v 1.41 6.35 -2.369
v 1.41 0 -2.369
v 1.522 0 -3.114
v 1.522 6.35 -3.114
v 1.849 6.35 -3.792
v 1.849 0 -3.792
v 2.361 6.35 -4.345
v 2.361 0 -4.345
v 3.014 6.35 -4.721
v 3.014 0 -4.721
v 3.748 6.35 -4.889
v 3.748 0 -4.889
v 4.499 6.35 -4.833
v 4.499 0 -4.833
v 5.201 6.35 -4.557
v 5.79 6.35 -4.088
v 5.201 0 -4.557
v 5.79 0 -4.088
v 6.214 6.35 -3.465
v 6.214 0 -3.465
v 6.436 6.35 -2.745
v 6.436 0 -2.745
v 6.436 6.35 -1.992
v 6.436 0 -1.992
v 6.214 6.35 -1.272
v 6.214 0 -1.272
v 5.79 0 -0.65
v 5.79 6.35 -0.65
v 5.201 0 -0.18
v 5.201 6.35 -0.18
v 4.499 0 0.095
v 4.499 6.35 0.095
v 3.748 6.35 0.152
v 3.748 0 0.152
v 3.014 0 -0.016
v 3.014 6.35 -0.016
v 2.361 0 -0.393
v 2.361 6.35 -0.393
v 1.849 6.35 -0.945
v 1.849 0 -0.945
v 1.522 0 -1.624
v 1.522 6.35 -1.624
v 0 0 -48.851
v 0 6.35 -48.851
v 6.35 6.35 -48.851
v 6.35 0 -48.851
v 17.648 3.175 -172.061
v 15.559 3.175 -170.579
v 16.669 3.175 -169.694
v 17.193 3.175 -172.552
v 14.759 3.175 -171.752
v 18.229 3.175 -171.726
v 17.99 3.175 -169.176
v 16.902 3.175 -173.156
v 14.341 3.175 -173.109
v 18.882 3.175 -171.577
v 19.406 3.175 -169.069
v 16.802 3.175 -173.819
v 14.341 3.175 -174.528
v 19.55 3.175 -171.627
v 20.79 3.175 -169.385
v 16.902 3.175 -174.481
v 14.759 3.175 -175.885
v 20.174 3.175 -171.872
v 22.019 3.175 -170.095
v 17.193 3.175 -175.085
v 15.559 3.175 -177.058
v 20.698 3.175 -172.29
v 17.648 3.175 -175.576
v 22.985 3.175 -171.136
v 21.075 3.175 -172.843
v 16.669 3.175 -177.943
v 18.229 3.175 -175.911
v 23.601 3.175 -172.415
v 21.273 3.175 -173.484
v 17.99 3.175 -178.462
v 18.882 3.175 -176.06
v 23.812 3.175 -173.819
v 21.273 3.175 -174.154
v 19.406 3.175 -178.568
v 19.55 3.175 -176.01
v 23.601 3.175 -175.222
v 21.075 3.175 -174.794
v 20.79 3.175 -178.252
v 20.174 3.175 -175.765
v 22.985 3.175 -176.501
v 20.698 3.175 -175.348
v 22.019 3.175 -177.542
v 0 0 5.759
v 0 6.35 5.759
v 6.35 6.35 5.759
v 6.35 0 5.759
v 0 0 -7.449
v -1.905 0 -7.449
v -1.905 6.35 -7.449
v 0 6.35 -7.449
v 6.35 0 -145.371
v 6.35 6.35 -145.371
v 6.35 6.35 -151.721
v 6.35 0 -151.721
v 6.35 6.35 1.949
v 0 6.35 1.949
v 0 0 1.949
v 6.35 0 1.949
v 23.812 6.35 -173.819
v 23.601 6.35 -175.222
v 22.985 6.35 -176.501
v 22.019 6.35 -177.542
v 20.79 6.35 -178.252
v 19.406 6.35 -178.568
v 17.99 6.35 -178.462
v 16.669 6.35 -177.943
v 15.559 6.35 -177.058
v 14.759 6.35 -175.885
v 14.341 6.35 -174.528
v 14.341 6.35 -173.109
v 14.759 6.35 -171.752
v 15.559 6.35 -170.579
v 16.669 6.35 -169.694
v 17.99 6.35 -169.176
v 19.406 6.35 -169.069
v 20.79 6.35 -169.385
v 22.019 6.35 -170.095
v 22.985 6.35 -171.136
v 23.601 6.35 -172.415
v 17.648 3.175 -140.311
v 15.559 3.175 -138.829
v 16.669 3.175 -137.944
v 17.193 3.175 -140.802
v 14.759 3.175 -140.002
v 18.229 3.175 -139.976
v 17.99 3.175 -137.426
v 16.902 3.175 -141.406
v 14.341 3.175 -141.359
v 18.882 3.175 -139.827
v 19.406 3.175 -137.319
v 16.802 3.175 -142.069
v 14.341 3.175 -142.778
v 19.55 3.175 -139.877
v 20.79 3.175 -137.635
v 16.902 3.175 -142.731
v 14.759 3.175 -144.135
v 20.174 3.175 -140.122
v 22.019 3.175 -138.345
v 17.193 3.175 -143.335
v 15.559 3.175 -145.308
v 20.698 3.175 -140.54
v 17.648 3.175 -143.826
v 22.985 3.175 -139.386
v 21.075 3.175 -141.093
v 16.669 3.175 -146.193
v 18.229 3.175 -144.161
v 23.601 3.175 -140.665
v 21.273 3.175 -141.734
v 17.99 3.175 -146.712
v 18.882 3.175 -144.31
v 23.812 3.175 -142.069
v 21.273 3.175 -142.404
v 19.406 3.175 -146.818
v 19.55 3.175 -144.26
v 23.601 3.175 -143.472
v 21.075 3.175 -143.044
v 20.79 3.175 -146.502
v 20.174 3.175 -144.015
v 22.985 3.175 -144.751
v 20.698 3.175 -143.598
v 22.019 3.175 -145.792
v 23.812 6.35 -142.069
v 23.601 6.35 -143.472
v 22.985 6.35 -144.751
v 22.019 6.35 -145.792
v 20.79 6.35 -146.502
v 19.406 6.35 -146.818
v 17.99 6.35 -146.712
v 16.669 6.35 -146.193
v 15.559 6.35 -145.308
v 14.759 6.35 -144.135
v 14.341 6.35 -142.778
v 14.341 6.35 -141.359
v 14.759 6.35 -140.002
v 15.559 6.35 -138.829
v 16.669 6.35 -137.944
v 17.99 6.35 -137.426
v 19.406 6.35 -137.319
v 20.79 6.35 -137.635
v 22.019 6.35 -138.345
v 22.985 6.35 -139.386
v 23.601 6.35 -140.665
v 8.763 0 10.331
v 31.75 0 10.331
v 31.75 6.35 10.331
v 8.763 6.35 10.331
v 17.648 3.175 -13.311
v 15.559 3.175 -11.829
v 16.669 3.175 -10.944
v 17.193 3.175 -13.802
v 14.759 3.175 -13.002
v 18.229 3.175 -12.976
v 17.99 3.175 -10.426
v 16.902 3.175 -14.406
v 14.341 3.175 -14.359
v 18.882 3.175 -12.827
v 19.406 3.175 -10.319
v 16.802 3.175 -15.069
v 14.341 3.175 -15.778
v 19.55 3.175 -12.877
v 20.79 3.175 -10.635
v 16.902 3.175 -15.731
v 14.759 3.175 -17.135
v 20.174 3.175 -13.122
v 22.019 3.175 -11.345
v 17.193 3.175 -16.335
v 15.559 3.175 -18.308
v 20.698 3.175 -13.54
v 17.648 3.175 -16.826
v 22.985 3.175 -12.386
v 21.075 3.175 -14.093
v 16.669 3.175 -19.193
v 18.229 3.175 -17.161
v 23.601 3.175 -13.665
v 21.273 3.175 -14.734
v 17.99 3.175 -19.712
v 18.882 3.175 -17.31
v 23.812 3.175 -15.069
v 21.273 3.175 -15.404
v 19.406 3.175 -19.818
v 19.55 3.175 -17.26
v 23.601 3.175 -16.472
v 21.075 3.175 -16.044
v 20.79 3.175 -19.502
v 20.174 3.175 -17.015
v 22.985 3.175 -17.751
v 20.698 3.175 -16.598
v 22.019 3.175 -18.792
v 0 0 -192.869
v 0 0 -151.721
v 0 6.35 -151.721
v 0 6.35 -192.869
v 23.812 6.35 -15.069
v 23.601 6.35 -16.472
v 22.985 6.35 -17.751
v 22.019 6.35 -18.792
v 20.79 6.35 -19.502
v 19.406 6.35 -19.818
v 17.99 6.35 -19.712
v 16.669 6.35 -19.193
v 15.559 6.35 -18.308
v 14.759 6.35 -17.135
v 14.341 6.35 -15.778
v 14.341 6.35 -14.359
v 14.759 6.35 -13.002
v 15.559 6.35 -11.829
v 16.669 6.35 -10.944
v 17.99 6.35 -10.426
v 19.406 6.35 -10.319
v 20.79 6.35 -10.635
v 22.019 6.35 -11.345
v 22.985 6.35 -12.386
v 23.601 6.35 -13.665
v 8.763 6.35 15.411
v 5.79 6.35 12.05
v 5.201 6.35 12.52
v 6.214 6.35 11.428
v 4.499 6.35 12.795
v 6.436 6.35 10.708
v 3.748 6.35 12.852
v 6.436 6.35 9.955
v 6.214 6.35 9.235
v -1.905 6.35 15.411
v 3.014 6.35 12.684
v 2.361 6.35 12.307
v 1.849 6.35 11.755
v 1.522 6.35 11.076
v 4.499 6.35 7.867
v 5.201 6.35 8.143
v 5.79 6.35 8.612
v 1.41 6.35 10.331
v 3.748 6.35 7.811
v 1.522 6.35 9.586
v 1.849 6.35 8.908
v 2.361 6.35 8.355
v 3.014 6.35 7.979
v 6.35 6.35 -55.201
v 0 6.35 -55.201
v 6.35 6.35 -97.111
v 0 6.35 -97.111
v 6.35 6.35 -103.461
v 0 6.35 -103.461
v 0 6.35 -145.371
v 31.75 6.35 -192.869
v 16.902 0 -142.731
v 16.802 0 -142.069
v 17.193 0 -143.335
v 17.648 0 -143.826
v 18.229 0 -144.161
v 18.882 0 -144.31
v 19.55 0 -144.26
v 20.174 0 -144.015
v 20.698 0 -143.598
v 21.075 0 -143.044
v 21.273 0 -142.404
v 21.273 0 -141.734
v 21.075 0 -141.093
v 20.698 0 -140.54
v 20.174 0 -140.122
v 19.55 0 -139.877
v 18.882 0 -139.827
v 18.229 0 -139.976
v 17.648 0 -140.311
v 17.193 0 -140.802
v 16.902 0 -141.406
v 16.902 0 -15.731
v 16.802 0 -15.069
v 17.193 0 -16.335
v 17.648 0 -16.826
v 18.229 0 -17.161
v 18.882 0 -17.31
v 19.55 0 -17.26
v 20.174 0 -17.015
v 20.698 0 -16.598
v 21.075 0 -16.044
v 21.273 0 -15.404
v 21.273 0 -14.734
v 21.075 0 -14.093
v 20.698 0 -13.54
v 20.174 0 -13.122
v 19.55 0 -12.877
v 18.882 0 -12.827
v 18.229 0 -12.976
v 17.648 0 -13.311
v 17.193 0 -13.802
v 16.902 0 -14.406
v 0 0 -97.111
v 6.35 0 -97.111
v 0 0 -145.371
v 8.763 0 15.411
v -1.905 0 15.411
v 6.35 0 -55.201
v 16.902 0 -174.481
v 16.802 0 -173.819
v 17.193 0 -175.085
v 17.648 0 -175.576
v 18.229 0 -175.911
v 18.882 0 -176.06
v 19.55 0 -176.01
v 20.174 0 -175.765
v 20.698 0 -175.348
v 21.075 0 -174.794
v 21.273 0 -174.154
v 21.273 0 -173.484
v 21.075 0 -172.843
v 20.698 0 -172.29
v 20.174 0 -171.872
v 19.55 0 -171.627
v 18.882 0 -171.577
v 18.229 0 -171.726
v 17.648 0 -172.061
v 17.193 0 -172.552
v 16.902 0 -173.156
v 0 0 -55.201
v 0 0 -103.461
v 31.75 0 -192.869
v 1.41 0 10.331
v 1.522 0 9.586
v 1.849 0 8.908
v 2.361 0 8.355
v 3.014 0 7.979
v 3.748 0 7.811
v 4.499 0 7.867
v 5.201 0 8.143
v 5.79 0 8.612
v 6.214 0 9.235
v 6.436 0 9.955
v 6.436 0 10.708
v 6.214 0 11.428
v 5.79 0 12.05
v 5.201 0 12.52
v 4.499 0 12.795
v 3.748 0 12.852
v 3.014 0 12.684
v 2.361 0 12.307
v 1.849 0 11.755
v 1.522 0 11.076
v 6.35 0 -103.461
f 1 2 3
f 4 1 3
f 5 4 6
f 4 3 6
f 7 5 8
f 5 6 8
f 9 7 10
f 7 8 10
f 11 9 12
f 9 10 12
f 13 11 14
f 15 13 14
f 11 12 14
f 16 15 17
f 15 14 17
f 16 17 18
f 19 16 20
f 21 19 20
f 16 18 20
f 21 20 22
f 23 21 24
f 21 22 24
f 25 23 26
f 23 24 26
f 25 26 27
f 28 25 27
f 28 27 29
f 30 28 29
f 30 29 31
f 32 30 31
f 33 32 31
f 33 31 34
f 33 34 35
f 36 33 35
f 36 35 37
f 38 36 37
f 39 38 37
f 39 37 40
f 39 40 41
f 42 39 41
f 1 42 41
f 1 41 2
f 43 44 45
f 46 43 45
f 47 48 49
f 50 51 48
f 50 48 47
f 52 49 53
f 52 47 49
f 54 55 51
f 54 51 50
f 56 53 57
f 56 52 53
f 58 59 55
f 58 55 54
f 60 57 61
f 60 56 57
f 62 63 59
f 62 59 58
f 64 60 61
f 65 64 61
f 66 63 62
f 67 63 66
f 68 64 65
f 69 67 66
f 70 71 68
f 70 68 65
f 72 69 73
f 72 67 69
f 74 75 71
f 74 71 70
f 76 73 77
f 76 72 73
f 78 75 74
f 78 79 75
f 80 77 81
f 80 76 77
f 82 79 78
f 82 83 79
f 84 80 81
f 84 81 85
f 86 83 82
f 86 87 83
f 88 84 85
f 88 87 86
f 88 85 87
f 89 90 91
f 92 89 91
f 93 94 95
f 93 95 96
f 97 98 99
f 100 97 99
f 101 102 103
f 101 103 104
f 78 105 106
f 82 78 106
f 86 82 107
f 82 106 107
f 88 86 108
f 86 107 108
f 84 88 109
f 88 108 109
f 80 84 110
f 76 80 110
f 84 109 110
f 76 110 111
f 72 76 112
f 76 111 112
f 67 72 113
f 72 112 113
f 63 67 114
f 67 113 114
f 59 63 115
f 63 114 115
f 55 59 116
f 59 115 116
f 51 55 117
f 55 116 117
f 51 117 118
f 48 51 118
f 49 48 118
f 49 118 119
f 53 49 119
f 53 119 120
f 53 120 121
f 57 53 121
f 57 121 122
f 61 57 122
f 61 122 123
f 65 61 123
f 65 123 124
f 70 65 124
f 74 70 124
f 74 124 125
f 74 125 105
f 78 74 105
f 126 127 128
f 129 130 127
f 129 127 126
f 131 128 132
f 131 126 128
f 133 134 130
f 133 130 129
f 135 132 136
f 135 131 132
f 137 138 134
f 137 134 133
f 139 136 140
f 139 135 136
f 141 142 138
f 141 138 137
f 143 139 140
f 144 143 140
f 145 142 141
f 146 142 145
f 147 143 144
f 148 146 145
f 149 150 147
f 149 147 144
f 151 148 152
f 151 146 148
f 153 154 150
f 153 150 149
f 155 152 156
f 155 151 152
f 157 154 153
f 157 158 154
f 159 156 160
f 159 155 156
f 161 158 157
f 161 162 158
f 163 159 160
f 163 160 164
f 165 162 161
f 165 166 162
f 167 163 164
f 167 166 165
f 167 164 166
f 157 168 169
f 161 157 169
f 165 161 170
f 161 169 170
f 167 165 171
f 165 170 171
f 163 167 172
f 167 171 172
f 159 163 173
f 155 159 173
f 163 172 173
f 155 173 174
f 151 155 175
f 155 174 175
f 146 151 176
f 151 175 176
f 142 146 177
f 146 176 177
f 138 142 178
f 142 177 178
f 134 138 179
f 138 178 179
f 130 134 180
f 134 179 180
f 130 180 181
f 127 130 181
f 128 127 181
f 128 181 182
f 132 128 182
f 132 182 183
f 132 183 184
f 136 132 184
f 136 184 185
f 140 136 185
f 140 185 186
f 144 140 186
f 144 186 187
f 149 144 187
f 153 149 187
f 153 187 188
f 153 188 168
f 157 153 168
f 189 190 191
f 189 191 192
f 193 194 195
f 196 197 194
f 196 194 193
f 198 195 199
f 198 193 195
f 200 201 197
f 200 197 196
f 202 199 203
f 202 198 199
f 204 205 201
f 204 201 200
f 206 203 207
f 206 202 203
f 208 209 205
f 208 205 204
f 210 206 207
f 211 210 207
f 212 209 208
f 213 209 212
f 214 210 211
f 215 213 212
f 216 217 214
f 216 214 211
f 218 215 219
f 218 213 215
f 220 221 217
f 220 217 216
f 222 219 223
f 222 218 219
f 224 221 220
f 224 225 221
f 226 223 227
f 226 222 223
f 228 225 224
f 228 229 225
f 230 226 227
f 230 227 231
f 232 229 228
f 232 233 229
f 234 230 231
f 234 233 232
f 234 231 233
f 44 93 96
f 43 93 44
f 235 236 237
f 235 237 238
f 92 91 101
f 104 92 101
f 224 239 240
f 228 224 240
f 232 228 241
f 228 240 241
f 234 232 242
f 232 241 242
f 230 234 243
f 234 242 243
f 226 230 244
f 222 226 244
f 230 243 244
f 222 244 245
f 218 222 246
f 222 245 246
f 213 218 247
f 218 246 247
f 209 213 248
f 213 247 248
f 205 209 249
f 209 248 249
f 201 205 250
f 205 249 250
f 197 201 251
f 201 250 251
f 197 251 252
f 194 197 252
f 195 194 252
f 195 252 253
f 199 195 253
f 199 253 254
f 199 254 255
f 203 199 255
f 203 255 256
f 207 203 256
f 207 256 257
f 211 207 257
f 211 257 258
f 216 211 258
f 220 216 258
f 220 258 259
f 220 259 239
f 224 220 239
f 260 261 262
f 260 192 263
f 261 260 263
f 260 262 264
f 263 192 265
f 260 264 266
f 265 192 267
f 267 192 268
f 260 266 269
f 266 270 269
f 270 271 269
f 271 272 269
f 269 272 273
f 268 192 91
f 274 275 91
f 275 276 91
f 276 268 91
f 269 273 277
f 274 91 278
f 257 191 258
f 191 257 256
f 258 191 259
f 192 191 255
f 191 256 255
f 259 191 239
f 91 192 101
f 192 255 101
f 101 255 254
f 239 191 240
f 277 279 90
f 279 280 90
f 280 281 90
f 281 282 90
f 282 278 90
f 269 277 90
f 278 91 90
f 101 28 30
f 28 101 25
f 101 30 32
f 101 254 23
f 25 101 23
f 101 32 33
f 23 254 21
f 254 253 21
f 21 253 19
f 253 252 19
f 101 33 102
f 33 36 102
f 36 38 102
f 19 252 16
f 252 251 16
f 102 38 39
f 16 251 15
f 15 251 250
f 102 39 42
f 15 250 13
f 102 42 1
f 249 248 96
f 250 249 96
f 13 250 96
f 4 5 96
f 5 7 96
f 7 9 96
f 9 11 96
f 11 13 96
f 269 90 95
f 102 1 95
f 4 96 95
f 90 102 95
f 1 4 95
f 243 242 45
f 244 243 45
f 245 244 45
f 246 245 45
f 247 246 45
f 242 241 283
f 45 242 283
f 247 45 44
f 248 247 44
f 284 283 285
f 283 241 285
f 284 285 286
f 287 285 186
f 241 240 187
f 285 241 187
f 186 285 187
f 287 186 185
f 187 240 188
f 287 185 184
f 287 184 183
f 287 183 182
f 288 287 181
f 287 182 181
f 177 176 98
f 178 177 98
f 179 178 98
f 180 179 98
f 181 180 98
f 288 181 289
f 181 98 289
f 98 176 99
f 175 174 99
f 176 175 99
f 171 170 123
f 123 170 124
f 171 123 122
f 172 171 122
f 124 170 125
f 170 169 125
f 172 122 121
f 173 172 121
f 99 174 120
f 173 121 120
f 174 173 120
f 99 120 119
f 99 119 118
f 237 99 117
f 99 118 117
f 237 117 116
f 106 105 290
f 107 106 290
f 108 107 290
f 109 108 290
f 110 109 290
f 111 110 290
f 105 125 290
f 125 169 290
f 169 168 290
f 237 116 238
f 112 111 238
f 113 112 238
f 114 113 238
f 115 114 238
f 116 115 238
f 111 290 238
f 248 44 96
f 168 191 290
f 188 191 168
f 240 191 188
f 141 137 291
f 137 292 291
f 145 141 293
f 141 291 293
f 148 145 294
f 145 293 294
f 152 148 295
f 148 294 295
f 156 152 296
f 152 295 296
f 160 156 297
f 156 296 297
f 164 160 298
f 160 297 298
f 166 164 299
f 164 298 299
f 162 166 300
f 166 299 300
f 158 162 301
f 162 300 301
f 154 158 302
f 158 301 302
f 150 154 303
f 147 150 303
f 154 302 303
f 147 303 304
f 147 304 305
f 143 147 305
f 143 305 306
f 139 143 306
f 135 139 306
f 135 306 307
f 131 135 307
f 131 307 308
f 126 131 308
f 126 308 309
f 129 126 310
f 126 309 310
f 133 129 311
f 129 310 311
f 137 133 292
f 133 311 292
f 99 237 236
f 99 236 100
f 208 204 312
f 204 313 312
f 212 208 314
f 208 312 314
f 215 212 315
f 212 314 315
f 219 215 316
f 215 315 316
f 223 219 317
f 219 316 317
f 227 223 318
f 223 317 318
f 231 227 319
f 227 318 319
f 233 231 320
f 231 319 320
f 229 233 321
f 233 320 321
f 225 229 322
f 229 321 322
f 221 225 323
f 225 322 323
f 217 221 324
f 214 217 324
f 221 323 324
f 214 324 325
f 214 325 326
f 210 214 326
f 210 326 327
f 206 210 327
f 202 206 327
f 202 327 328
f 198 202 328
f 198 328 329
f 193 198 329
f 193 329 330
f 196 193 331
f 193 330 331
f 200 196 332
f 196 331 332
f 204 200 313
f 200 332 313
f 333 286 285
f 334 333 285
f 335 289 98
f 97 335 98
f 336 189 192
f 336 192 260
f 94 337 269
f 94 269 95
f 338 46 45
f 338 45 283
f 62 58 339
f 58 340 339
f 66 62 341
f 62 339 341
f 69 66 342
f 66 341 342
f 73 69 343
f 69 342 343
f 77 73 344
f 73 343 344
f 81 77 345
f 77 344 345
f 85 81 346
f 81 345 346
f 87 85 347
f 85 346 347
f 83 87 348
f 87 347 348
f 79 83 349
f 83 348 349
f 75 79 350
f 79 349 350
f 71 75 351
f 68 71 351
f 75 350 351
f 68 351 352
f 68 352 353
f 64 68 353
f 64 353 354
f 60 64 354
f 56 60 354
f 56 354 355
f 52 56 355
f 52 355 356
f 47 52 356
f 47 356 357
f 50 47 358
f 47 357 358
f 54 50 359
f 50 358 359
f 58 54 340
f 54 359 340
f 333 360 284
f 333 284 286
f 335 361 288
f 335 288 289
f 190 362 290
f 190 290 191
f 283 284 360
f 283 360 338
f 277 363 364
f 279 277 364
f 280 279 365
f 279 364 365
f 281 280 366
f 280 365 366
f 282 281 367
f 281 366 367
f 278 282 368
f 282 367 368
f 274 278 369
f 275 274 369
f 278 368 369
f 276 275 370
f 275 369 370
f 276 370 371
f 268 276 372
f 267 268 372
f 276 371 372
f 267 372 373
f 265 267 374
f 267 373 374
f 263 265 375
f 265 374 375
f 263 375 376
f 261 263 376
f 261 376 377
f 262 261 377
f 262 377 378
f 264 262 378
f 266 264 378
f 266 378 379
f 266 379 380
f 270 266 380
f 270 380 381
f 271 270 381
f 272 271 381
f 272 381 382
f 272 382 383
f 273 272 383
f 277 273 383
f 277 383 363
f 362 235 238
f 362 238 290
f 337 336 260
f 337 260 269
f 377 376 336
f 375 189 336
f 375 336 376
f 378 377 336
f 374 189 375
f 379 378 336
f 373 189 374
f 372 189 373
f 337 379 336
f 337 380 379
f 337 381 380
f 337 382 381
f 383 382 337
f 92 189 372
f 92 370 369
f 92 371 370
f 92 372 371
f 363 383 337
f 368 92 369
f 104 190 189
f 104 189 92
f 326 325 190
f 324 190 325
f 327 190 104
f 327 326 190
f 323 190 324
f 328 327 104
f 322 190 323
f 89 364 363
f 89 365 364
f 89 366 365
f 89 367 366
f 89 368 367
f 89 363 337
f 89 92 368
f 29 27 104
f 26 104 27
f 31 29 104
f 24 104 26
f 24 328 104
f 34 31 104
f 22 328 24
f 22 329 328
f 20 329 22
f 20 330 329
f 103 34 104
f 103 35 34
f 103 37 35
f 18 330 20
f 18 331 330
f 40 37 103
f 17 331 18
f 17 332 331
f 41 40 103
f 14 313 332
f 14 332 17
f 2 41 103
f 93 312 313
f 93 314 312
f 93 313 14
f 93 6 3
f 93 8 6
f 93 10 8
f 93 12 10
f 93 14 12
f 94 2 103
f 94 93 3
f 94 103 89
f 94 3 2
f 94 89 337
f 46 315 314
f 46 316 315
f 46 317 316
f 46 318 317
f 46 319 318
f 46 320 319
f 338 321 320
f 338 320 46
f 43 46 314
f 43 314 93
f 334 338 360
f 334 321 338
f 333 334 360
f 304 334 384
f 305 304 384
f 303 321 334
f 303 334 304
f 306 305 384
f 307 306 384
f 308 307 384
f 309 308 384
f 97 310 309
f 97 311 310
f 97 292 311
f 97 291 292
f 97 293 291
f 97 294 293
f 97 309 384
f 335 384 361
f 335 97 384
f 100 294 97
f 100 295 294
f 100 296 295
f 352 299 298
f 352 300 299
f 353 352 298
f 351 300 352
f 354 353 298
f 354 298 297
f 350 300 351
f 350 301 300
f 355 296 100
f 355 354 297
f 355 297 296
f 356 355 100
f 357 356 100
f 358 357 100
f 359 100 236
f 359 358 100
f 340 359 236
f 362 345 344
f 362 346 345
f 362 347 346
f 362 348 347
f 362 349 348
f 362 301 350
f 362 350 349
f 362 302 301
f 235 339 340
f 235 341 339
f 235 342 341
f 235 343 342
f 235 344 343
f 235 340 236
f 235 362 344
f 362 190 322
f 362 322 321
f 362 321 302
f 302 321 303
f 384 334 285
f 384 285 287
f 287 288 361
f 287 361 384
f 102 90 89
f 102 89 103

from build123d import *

# Parameters (mm, degrees)
BOSS_EXTRUDE1_DEPTH                                 = 6.35
SKETCH2_W                                           = 6.35
SKETCH2_H                                           = 6.35
CUT_EXTRUDE1_DEPTH                                  = 7.35
F_8_0_199_DIAMETER_HOLE1_D                          = 5.0546
SKETCH5_W                                           = 6.35
SKETCH5_H                                           = 3.81
CUT_EXTRUDE2_DEPTH                                  = 7.35
CBORE_FOR_8_BINDING_HEAD_MACHINE_SCREW1_D           = 4.4958
CBORE_FOR_8_BINDING_HEAD_MACHINE_SCREW1_CBORE_D     = 9.525
CBORE_FOR_8_BINDING_HEAD_MACHINE_SCREW1_CBORE_DEPTH = 3.175


with BuildPart() as part:
    # Sketch1 → Boss-Extrude1 (new body)
    with BuildSketch(Plane(origin=(0, 0, 0), x_dir=(1, 0, 0), z_dir=(0, 1, 0))):
        Polygon((8.763, -10.331391255), (8.763, -15.411391255), (-1.905, -15.411391255), (-1.905, 7.448608745), (0, 7.448608745), (0, 192.868608745), (31.75, 192.868608745), (31.75, -10.331391255), align=None)
    extrude(amount=BOSS_EXTRUDE1_DEPTH)

    # Sketch2 → Cut-Extrude1 (cut, through all)
    with BuildSketch(Plane(origin=(0, 6.35, 0), x_dir=(1, 0, 0), z_dir=(0, 1, 0))):
        with Locations((3.175, 52.025608745)):
            Rectangle(SKETCH2_W, SKETCH2_H)
        with Locations((3.175, 100.285608745)):
            Rectangle(SKETCH2_W, SKETCH2_H)
        with Locations((3.175, 148.545608745)):
            Rectangle(SKETCH2_W, SKETCH2_H)
    extrude(amount=-CUT_EXTRUDE1_DEPTH, mode=Mode.SUBTRACT)

    # #8 (0.199) Diameter Hole1 (through all)
    with Locations(Plane(origin=(0, 6.35, 0), x_dir=(1, 0, 0), z_dir=(0, 1, 0))):
        with Locations((3.937, 2.368608745), (3.937, -10.331391255)):
            Hole(F_8_0_199_DIAMETER_HOLE1_D / 2)

    # Sketch5 → Cut-Extrude2 (cut, through all)
    with BuildSketch(Plane(origin=(0, 6.35, 0), x_dir=(1, 0, 0), z_dir=(0, 1, 0))):
        with Locations((3.175, -3.854391255)):
            Rectangle(SKETCH5_W, SKETCH5_H)
    extrude(amount=-CUT_EXTRUDE2_DEPTH, mode=Mode.SUBTRACT)

    # CBORE for #8 Binding Head Machine Screw1 (through all)
    with Locations(Plane(origin=(0, 6.35, 0), x_dir=(1, 0, 0), z_dir=(0, 1, 0))):
        with Locations((19.05, 173.818608745), (19.05, 142.068608745), (19.05, 15.068608745)):
            CounterBoreHole(CBORE_FOR_8_BINDING_HEAD_MACHINE_SCREW1_D / 2, CBORE_FOR_8_BINDING_HEAD_MACHINE_SCREW1_CBORE_D / 2, CBORE_FOR_8_BINDING_HEAD_MACHINE_SCREW1_CBORE_DEPTH)


solid = part.part
